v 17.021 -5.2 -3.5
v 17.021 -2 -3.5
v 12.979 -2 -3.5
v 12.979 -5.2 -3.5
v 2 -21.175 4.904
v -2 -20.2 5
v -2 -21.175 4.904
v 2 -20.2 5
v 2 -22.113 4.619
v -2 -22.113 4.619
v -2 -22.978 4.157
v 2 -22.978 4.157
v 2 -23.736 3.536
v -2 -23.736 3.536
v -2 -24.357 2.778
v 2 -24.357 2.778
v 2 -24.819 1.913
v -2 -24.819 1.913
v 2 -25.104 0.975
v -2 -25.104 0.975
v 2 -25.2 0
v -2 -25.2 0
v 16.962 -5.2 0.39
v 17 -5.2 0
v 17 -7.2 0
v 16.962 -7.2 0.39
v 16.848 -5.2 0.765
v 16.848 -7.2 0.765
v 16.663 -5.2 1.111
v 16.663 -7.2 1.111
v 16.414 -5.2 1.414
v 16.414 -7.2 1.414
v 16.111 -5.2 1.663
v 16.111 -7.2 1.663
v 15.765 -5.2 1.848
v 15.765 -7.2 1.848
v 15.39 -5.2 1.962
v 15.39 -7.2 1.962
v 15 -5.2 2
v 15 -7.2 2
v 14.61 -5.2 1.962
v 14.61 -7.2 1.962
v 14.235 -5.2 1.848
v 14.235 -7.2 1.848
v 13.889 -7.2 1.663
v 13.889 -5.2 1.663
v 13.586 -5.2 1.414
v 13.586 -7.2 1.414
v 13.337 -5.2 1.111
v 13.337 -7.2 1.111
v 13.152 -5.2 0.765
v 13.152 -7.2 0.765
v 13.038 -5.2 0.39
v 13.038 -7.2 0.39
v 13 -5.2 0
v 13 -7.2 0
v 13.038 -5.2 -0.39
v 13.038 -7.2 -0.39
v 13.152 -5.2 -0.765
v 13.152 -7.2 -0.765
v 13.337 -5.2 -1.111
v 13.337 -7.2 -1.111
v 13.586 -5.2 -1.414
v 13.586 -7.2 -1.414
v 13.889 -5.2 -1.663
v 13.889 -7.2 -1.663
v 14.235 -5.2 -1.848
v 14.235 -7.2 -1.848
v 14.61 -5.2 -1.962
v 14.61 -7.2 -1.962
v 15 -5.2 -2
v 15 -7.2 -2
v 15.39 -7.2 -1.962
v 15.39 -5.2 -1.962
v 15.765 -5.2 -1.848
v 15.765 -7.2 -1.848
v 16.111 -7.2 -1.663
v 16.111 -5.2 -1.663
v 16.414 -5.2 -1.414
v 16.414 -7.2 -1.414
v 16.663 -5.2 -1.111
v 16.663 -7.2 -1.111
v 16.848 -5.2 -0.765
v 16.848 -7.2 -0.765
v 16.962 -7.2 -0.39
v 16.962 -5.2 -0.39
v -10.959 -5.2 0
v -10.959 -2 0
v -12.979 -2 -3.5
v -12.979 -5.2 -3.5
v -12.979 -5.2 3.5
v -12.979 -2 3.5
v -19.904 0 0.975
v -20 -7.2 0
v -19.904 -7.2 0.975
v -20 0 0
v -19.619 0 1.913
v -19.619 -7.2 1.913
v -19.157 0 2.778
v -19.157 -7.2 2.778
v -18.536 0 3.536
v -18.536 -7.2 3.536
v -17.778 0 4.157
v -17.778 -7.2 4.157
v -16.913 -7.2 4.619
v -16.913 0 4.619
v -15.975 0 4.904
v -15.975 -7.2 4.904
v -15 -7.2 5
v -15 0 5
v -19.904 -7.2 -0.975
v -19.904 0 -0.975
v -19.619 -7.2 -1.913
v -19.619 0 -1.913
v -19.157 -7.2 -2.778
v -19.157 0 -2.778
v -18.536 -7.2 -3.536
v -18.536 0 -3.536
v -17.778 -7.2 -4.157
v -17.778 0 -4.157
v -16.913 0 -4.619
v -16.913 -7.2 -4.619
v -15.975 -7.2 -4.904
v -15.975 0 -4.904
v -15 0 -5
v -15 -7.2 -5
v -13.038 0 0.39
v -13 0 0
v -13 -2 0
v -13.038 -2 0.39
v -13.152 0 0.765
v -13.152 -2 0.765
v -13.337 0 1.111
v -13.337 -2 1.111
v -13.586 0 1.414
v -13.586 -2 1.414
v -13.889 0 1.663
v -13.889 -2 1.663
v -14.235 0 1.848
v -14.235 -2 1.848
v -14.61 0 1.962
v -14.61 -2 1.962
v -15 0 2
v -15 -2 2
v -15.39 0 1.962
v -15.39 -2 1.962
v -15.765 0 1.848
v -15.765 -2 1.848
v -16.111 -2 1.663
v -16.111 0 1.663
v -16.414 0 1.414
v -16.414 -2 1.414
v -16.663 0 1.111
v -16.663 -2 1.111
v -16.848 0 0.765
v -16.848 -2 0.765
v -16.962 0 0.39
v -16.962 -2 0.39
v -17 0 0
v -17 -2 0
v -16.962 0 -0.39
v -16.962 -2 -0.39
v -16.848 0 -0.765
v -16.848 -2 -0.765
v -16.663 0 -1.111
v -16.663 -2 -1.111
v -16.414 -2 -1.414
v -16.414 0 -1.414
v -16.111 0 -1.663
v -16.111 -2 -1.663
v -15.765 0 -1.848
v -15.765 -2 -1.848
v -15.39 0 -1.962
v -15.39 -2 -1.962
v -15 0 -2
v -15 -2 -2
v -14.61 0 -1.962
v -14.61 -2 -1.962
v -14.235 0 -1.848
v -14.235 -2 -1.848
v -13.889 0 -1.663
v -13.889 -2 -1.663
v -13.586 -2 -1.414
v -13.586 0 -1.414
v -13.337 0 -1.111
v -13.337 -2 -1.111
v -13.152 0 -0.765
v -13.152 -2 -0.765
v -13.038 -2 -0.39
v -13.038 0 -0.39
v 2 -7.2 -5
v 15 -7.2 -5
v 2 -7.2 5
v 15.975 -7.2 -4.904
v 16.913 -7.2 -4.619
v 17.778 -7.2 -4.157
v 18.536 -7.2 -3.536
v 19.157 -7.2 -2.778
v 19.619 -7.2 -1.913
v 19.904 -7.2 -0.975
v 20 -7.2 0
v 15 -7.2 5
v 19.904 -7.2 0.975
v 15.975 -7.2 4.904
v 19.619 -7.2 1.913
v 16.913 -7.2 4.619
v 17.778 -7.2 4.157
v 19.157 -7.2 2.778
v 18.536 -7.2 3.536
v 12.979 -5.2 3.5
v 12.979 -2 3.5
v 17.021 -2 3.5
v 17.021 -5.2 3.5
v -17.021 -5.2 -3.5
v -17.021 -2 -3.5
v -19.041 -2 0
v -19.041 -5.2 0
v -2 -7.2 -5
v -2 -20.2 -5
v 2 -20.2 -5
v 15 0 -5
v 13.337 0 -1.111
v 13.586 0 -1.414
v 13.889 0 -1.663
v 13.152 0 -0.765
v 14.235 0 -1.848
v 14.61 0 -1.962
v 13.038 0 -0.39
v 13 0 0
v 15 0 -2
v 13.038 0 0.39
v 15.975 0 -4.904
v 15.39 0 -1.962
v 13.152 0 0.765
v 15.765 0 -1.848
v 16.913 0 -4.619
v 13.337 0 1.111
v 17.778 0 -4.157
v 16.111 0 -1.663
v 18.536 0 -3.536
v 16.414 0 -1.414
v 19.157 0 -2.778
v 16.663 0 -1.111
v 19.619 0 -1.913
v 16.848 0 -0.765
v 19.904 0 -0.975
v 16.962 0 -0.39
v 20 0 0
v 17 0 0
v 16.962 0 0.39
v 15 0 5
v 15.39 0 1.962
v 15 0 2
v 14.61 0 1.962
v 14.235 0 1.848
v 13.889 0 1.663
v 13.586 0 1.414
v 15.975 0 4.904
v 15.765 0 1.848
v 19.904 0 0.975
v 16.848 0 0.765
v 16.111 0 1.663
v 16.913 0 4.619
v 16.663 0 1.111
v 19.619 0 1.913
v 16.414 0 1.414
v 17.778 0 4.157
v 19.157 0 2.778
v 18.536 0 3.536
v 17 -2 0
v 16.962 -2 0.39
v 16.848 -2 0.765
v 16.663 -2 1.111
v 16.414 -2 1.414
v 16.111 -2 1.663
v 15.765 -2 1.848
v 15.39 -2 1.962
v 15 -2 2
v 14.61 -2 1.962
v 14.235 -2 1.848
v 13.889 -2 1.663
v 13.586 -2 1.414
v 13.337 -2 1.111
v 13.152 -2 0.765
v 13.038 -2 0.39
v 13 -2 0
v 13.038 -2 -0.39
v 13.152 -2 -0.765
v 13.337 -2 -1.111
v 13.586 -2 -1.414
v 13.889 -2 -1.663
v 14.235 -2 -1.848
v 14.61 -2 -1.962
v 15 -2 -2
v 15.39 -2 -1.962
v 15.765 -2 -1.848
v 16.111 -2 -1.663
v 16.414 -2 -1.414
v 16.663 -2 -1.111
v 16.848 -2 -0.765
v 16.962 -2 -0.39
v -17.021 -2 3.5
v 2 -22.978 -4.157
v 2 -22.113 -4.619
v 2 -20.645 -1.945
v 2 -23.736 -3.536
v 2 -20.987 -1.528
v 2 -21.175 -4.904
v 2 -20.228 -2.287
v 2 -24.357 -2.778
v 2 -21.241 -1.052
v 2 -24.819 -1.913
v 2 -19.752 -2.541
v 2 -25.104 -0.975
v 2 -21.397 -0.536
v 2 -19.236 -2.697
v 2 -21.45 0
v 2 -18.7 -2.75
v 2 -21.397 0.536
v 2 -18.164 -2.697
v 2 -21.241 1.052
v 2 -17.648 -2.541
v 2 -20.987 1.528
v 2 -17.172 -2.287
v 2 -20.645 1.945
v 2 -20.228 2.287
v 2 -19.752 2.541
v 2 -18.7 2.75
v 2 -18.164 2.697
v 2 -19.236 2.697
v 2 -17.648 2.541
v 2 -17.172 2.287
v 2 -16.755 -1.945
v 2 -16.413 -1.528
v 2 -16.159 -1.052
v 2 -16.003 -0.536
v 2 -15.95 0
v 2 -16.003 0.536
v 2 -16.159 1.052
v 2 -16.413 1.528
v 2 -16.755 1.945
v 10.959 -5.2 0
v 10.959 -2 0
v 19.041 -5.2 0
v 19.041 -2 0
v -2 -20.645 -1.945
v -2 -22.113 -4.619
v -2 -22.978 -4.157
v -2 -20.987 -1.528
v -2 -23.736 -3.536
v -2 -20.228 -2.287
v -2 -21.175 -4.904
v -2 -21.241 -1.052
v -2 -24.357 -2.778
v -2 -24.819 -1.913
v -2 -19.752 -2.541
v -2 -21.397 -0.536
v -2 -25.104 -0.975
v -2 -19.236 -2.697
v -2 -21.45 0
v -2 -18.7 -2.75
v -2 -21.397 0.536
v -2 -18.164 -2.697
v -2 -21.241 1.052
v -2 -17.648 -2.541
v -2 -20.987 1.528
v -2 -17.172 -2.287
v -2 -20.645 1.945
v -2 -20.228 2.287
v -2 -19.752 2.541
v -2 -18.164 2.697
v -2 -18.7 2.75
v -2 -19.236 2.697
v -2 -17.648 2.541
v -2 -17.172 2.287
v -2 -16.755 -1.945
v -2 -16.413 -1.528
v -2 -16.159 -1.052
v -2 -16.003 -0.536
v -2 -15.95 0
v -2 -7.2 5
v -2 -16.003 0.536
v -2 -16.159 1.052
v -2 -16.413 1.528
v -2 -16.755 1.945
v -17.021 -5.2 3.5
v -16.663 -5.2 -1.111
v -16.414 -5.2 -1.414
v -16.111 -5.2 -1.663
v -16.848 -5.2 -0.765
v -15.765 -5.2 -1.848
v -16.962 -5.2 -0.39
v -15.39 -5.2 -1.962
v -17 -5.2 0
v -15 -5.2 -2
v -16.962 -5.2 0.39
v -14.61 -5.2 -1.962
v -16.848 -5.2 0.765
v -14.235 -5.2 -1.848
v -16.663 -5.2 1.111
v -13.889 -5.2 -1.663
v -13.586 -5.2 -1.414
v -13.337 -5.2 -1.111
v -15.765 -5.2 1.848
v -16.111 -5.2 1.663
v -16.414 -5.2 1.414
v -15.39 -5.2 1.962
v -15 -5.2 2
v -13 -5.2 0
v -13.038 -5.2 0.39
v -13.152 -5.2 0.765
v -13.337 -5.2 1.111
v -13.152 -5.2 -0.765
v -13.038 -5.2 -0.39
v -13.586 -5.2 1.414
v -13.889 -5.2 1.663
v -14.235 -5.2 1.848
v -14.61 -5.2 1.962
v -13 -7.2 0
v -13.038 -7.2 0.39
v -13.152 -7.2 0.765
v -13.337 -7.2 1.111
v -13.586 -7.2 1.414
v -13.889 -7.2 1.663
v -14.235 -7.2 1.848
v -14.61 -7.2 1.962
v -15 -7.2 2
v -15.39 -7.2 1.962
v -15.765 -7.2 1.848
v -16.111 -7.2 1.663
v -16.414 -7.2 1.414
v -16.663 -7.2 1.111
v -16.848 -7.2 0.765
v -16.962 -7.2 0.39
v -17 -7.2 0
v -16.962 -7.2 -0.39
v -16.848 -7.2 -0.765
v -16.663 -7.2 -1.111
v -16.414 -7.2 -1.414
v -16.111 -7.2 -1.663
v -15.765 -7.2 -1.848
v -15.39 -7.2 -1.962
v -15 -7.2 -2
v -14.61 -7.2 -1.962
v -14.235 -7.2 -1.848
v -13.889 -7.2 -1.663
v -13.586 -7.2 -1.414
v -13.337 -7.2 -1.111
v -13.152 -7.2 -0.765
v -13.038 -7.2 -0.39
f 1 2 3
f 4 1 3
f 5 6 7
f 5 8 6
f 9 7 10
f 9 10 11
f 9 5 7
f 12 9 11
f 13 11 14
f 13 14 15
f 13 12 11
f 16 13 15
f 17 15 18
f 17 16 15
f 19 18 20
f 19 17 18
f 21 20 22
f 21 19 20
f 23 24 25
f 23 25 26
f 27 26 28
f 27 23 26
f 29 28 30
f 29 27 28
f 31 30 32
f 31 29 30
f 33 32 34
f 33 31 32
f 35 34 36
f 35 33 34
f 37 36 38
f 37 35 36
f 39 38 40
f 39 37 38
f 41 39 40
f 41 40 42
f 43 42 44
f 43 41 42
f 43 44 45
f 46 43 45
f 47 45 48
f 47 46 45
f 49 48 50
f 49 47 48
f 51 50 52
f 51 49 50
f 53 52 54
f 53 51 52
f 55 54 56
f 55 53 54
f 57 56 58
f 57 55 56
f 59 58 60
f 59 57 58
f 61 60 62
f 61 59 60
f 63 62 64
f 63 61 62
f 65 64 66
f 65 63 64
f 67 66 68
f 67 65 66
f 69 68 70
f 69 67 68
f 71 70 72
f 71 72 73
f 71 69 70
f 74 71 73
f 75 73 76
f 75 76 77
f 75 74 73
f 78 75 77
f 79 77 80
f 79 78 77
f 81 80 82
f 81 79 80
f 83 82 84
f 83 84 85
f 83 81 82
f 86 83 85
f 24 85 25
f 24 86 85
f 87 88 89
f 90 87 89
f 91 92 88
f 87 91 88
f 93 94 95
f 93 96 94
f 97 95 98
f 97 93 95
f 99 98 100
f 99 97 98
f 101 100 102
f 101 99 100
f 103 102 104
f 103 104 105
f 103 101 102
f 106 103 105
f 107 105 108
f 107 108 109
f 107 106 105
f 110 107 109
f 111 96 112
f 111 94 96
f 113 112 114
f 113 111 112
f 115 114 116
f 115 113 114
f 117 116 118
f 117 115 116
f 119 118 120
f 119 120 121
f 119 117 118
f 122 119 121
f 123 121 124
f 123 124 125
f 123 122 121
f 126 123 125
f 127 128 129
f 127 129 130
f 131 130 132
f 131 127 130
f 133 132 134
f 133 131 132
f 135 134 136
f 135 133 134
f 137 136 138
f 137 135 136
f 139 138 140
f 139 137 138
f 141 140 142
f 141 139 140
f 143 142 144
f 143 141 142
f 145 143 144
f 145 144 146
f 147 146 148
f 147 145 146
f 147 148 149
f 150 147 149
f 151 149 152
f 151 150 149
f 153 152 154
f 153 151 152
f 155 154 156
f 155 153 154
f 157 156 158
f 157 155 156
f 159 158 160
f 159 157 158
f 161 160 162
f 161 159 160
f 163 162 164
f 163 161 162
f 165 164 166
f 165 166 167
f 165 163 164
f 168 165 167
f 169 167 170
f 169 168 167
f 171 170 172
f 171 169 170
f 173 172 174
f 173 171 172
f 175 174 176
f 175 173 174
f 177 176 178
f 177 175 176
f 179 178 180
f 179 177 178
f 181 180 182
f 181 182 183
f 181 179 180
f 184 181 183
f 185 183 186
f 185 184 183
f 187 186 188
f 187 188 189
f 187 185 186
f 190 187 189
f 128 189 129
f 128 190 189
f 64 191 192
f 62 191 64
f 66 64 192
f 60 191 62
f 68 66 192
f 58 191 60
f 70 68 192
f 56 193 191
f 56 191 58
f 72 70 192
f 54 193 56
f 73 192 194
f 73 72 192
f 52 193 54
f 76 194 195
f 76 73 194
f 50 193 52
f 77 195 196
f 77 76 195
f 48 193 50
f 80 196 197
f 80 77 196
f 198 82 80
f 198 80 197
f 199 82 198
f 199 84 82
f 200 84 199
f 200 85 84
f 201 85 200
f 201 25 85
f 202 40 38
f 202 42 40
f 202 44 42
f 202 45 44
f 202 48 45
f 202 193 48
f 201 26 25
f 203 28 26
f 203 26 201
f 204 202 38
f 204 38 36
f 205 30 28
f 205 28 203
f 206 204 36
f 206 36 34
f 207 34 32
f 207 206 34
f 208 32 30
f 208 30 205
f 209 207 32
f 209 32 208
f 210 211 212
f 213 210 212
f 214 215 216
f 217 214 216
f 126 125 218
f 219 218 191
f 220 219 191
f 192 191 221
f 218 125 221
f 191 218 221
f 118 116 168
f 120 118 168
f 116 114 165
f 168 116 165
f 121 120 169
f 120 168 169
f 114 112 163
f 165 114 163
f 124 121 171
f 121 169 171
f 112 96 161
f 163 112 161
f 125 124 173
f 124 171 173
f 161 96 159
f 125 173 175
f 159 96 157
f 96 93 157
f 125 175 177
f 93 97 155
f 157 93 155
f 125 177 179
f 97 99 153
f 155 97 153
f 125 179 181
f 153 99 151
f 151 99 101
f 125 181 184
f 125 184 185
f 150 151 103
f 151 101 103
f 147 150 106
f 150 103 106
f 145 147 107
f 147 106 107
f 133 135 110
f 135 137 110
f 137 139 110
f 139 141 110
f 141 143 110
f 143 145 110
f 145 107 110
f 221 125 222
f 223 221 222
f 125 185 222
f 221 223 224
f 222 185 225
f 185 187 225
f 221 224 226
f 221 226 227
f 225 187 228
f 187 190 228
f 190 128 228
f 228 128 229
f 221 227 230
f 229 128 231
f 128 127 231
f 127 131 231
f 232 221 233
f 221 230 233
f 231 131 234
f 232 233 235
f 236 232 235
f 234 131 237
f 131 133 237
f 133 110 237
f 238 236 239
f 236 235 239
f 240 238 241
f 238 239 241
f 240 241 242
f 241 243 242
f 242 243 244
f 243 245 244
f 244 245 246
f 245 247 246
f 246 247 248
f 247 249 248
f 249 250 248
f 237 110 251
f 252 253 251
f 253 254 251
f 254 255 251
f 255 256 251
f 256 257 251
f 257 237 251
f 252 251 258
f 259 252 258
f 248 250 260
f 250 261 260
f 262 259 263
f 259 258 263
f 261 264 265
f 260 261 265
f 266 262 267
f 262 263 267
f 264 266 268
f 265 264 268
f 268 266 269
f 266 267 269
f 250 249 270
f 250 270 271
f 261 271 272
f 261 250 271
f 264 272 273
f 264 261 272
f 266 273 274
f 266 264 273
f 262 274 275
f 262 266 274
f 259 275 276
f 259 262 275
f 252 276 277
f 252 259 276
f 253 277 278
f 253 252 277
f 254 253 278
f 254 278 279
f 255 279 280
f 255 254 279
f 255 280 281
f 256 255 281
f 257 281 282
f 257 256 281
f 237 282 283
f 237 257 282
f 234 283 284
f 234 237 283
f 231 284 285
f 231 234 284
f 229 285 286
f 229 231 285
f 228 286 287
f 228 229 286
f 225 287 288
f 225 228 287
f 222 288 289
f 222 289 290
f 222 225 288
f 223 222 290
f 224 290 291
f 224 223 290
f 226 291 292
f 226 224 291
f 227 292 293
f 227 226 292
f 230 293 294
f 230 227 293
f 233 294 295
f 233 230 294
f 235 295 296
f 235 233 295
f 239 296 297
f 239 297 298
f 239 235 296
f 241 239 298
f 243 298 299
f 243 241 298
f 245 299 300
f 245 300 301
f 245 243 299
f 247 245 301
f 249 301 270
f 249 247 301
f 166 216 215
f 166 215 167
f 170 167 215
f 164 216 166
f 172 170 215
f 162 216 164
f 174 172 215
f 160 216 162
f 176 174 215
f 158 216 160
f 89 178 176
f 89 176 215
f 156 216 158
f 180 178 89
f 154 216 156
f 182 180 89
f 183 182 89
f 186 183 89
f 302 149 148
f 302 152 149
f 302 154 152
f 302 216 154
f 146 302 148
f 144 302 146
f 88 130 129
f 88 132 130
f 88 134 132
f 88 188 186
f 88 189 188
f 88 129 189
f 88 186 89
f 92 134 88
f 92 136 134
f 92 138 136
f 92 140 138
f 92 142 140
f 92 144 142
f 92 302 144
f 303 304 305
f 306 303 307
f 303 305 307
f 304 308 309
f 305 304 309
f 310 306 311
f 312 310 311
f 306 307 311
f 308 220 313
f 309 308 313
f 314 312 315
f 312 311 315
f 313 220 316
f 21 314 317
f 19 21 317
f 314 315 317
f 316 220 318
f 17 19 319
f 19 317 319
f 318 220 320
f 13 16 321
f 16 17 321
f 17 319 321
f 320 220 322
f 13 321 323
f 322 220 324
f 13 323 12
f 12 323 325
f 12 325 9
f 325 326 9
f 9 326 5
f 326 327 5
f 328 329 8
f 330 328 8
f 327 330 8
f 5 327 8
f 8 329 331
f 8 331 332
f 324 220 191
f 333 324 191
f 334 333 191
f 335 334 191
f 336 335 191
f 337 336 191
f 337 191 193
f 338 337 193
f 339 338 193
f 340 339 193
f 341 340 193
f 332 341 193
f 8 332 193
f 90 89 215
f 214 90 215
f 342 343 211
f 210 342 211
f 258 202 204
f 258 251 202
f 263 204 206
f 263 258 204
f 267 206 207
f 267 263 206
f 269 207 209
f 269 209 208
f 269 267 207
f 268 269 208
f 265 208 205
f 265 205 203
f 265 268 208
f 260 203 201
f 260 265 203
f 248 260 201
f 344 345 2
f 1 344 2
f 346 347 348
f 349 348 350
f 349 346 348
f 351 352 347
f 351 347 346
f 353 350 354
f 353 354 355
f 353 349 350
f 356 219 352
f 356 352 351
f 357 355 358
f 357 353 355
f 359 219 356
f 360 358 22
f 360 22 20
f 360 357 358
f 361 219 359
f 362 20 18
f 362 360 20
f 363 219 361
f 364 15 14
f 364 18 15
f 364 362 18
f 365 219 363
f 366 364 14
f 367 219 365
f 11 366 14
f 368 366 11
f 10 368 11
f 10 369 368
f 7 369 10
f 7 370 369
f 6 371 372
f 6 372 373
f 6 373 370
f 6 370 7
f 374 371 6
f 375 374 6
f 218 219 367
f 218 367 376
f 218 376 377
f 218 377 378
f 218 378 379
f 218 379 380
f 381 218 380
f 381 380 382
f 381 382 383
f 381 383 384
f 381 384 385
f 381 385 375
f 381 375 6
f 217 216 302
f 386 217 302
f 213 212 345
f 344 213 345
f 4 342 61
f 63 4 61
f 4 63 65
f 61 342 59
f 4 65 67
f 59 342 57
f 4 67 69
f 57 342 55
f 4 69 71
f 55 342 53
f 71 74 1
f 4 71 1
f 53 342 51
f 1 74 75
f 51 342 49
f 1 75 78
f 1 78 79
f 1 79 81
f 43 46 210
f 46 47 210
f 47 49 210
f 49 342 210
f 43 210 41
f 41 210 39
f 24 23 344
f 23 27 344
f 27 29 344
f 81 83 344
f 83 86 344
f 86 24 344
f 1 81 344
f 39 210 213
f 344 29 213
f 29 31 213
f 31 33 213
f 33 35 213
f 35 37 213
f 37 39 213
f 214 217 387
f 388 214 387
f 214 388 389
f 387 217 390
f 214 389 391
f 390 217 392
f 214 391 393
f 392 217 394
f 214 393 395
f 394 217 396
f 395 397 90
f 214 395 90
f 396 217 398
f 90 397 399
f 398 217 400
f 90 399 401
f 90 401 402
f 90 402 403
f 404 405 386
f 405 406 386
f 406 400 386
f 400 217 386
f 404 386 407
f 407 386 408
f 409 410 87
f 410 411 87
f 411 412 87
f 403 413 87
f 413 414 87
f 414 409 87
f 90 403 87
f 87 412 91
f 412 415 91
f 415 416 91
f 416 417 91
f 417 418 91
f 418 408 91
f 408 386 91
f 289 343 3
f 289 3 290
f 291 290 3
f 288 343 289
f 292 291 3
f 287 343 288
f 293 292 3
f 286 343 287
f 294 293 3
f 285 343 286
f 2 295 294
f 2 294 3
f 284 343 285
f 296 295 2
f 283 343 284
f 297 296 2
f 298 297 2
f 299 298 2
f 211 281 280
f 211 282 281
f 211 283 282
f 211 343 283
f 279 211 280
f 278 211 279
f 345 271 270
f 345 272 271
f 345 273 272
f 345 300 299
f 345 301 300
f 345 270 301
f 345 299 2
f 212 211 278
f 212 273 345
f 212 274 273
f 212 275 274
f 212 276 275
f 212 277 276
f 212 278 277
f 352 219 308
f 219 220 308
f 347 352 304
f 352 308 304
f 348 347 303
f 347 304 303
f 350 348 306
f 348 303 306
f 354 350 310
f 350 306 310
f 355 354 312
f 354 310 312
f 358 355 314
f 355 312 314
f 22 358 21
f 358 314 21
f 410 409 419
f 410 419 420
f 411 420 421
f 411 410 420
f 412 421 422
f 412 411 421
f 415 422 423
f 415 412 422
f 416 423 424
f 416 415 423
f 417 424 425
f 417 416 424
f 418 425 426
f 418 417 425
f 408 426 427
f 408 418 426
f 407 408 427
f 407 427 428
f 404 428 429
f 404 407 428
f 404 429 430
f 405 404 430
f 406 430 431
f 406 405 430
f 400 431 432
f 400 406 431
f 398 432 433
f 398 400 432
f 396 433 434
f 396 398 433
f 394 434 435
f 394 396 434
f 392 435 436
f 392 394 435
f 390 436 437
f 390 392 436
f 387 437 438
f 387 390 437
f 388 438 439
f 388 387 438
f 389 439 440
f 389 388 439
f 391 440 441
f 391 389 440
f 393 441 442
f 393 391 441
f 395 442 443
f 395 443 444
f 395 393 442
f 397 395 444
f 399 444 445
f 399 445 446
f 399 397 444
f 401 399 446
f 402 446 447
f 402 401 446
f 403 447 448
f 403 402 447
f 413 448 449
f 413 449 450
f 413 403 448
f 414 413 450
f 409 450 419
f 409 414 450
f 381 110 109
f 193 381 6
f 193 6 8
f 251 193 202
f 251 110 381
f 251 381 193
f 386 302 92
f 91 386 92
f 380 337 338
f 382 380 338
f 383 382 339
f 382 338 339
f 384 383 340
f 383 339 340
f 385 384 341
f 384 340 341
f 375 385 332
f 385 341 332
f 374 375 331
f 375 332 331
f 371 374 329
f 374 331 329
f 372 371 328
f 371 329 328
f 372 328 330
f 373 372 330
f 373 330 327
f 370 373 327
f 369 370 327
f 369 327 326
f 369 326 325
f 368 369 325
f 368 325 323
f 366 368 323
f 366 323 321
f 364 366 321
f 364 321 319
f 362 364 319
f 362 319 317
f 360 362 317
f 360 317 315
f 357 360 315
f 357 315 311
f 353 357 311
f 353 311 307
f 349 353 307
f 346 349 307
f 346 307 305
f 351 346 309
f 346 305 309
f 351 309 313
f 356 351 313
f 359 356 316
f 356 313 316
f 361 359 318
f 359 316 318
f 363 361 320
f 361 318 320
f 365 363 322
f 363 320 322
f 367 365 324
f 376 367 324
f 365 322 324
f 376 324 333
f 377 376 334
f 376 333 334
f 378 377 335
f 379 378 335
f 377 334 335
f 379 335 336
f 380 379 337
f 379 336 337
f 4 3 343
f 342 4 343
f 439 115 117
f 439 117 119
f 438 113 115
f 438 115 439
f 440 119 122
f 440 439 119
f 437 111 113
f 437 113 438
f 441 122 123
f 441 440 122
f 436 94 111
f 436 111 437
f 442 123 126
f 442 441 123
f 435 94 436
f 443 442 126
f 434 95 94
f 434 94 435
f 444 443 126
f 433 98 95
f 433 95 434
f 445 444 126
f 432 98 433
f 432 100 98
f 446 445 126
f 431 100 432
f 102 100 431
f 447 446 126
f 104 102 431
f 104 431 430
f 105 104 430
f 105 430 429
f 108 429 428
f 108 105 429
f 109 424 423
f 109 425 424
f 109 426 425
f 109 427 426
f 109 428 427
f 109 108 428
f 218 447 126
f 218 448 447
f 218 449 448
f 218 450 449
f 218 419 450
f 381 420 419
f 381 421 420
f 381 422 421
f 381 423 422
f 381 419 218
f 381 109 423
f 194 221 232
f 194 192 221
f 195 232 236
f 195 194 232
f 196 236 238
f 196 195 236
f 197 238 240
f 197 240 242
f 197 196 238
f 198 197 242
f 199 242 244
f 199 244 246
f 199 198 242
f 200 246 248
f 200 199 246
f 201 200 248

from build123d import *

# Parameters (mm, degrees)
F0_W     = 40
F0_H     = 10
F0_R     = 2
F1_DEPTH = 2
F2_W     = 40
F2_H     = 10
F3_DEPTH = 3.2
F4_START = 5.2
F4_DEPTH = 2
F5_W     = 4
F5_H     = 10
F6_DEPTH = 18
F7_R     = 2.75
F8_DEPTH = 25
F9_R     = 4.99999


# Not quite as in the source:
# - a fillet or chamfer is up to 0.001 mm smaller than in the source, because OpenCascade refuses the exact size


with BuildPart() as f1:
    # F0 (on Front) → F1 (new body)
    with BuildSketch(Plane.XZ):
        Rectangle(F0_W, F0_H)
        with Locations((-15, 0)):
            Circle(F0_R, mode=Mode.SUBTRACT)
        with Locations((15, 0)):
            Circle(F0_R, mode=Mode.SUBTRACT)
    extrude(amount=F1_DEPTH)

    # F2 (on face) → F3 (join)
    with BuildSketch(Plane.XZ.offset(2)):
        Rectangle(F2_W, F2_H)
        Polygon((-10.9585481157, 0), (-12.9792740578, -3.5), (-17.0207259422, -3.5), (-19.0414518843, 0), (-17.0207259422, 3.5), (-12.9792740578, 3.5), align=None, mode=Mode.SUBTRACT)
        Polygon((19.0414518843, 0), (17.0207259422, -3.5), (12.9792740578, -3.5), (10.9585481157, 0), (12.9792740578, 3.5), (17.0207259422, 3.5), align=None, mode=Mode.SUBTRACT)
    extrude(amount=F3_DEPTH)

    # F0 (on Front) → F4 (join)
    with BuildSketch(Plane.XZ.offset(F4_START)):
        Rectangle(F0_W, F0_H)
        with Locations((-15, 0)):
            Circle(F0_R, mode=Mode.SUBTRACT)
        with Locations((15, 0)):
            Circle(F0_R, mode=Mode.SUBTRACT)
    extrude(amount=F4_DEPTH)

    # F5 (on face) → F6 (join)
    with BuildSketch(Plane.XZ.offset(7.2)):
        Rectangle(F5_W, F5_H)
    extrude(amount=F6_DEPTH)

    # F7 (on face) → F8 (cut)
    with BuildSketch(Plane.YZ.offset(2)):
        with Locations((-18.7, 0)):
            Circle(F7_R)
    extrude(amount=-F8_DEPTH, mode=Mode.SUBTRACT)

    # F9 (radius 5 in the source; OpenCascade refuses exactly that, so slightly less here)
    f9_edges = [f1.edges().sort_by_distance(p)[0] for p in [
        (0, -25.2, 5),
        (0, -25.2, -5),
        (20, -3.6, 5),
        (20, -3.6, -5),
        (-20, -3.6, 5),
        (-20, -3.6, -5),
    ]]
    fillet(f9_edges, radius=F9_R)


solid = f1.part
